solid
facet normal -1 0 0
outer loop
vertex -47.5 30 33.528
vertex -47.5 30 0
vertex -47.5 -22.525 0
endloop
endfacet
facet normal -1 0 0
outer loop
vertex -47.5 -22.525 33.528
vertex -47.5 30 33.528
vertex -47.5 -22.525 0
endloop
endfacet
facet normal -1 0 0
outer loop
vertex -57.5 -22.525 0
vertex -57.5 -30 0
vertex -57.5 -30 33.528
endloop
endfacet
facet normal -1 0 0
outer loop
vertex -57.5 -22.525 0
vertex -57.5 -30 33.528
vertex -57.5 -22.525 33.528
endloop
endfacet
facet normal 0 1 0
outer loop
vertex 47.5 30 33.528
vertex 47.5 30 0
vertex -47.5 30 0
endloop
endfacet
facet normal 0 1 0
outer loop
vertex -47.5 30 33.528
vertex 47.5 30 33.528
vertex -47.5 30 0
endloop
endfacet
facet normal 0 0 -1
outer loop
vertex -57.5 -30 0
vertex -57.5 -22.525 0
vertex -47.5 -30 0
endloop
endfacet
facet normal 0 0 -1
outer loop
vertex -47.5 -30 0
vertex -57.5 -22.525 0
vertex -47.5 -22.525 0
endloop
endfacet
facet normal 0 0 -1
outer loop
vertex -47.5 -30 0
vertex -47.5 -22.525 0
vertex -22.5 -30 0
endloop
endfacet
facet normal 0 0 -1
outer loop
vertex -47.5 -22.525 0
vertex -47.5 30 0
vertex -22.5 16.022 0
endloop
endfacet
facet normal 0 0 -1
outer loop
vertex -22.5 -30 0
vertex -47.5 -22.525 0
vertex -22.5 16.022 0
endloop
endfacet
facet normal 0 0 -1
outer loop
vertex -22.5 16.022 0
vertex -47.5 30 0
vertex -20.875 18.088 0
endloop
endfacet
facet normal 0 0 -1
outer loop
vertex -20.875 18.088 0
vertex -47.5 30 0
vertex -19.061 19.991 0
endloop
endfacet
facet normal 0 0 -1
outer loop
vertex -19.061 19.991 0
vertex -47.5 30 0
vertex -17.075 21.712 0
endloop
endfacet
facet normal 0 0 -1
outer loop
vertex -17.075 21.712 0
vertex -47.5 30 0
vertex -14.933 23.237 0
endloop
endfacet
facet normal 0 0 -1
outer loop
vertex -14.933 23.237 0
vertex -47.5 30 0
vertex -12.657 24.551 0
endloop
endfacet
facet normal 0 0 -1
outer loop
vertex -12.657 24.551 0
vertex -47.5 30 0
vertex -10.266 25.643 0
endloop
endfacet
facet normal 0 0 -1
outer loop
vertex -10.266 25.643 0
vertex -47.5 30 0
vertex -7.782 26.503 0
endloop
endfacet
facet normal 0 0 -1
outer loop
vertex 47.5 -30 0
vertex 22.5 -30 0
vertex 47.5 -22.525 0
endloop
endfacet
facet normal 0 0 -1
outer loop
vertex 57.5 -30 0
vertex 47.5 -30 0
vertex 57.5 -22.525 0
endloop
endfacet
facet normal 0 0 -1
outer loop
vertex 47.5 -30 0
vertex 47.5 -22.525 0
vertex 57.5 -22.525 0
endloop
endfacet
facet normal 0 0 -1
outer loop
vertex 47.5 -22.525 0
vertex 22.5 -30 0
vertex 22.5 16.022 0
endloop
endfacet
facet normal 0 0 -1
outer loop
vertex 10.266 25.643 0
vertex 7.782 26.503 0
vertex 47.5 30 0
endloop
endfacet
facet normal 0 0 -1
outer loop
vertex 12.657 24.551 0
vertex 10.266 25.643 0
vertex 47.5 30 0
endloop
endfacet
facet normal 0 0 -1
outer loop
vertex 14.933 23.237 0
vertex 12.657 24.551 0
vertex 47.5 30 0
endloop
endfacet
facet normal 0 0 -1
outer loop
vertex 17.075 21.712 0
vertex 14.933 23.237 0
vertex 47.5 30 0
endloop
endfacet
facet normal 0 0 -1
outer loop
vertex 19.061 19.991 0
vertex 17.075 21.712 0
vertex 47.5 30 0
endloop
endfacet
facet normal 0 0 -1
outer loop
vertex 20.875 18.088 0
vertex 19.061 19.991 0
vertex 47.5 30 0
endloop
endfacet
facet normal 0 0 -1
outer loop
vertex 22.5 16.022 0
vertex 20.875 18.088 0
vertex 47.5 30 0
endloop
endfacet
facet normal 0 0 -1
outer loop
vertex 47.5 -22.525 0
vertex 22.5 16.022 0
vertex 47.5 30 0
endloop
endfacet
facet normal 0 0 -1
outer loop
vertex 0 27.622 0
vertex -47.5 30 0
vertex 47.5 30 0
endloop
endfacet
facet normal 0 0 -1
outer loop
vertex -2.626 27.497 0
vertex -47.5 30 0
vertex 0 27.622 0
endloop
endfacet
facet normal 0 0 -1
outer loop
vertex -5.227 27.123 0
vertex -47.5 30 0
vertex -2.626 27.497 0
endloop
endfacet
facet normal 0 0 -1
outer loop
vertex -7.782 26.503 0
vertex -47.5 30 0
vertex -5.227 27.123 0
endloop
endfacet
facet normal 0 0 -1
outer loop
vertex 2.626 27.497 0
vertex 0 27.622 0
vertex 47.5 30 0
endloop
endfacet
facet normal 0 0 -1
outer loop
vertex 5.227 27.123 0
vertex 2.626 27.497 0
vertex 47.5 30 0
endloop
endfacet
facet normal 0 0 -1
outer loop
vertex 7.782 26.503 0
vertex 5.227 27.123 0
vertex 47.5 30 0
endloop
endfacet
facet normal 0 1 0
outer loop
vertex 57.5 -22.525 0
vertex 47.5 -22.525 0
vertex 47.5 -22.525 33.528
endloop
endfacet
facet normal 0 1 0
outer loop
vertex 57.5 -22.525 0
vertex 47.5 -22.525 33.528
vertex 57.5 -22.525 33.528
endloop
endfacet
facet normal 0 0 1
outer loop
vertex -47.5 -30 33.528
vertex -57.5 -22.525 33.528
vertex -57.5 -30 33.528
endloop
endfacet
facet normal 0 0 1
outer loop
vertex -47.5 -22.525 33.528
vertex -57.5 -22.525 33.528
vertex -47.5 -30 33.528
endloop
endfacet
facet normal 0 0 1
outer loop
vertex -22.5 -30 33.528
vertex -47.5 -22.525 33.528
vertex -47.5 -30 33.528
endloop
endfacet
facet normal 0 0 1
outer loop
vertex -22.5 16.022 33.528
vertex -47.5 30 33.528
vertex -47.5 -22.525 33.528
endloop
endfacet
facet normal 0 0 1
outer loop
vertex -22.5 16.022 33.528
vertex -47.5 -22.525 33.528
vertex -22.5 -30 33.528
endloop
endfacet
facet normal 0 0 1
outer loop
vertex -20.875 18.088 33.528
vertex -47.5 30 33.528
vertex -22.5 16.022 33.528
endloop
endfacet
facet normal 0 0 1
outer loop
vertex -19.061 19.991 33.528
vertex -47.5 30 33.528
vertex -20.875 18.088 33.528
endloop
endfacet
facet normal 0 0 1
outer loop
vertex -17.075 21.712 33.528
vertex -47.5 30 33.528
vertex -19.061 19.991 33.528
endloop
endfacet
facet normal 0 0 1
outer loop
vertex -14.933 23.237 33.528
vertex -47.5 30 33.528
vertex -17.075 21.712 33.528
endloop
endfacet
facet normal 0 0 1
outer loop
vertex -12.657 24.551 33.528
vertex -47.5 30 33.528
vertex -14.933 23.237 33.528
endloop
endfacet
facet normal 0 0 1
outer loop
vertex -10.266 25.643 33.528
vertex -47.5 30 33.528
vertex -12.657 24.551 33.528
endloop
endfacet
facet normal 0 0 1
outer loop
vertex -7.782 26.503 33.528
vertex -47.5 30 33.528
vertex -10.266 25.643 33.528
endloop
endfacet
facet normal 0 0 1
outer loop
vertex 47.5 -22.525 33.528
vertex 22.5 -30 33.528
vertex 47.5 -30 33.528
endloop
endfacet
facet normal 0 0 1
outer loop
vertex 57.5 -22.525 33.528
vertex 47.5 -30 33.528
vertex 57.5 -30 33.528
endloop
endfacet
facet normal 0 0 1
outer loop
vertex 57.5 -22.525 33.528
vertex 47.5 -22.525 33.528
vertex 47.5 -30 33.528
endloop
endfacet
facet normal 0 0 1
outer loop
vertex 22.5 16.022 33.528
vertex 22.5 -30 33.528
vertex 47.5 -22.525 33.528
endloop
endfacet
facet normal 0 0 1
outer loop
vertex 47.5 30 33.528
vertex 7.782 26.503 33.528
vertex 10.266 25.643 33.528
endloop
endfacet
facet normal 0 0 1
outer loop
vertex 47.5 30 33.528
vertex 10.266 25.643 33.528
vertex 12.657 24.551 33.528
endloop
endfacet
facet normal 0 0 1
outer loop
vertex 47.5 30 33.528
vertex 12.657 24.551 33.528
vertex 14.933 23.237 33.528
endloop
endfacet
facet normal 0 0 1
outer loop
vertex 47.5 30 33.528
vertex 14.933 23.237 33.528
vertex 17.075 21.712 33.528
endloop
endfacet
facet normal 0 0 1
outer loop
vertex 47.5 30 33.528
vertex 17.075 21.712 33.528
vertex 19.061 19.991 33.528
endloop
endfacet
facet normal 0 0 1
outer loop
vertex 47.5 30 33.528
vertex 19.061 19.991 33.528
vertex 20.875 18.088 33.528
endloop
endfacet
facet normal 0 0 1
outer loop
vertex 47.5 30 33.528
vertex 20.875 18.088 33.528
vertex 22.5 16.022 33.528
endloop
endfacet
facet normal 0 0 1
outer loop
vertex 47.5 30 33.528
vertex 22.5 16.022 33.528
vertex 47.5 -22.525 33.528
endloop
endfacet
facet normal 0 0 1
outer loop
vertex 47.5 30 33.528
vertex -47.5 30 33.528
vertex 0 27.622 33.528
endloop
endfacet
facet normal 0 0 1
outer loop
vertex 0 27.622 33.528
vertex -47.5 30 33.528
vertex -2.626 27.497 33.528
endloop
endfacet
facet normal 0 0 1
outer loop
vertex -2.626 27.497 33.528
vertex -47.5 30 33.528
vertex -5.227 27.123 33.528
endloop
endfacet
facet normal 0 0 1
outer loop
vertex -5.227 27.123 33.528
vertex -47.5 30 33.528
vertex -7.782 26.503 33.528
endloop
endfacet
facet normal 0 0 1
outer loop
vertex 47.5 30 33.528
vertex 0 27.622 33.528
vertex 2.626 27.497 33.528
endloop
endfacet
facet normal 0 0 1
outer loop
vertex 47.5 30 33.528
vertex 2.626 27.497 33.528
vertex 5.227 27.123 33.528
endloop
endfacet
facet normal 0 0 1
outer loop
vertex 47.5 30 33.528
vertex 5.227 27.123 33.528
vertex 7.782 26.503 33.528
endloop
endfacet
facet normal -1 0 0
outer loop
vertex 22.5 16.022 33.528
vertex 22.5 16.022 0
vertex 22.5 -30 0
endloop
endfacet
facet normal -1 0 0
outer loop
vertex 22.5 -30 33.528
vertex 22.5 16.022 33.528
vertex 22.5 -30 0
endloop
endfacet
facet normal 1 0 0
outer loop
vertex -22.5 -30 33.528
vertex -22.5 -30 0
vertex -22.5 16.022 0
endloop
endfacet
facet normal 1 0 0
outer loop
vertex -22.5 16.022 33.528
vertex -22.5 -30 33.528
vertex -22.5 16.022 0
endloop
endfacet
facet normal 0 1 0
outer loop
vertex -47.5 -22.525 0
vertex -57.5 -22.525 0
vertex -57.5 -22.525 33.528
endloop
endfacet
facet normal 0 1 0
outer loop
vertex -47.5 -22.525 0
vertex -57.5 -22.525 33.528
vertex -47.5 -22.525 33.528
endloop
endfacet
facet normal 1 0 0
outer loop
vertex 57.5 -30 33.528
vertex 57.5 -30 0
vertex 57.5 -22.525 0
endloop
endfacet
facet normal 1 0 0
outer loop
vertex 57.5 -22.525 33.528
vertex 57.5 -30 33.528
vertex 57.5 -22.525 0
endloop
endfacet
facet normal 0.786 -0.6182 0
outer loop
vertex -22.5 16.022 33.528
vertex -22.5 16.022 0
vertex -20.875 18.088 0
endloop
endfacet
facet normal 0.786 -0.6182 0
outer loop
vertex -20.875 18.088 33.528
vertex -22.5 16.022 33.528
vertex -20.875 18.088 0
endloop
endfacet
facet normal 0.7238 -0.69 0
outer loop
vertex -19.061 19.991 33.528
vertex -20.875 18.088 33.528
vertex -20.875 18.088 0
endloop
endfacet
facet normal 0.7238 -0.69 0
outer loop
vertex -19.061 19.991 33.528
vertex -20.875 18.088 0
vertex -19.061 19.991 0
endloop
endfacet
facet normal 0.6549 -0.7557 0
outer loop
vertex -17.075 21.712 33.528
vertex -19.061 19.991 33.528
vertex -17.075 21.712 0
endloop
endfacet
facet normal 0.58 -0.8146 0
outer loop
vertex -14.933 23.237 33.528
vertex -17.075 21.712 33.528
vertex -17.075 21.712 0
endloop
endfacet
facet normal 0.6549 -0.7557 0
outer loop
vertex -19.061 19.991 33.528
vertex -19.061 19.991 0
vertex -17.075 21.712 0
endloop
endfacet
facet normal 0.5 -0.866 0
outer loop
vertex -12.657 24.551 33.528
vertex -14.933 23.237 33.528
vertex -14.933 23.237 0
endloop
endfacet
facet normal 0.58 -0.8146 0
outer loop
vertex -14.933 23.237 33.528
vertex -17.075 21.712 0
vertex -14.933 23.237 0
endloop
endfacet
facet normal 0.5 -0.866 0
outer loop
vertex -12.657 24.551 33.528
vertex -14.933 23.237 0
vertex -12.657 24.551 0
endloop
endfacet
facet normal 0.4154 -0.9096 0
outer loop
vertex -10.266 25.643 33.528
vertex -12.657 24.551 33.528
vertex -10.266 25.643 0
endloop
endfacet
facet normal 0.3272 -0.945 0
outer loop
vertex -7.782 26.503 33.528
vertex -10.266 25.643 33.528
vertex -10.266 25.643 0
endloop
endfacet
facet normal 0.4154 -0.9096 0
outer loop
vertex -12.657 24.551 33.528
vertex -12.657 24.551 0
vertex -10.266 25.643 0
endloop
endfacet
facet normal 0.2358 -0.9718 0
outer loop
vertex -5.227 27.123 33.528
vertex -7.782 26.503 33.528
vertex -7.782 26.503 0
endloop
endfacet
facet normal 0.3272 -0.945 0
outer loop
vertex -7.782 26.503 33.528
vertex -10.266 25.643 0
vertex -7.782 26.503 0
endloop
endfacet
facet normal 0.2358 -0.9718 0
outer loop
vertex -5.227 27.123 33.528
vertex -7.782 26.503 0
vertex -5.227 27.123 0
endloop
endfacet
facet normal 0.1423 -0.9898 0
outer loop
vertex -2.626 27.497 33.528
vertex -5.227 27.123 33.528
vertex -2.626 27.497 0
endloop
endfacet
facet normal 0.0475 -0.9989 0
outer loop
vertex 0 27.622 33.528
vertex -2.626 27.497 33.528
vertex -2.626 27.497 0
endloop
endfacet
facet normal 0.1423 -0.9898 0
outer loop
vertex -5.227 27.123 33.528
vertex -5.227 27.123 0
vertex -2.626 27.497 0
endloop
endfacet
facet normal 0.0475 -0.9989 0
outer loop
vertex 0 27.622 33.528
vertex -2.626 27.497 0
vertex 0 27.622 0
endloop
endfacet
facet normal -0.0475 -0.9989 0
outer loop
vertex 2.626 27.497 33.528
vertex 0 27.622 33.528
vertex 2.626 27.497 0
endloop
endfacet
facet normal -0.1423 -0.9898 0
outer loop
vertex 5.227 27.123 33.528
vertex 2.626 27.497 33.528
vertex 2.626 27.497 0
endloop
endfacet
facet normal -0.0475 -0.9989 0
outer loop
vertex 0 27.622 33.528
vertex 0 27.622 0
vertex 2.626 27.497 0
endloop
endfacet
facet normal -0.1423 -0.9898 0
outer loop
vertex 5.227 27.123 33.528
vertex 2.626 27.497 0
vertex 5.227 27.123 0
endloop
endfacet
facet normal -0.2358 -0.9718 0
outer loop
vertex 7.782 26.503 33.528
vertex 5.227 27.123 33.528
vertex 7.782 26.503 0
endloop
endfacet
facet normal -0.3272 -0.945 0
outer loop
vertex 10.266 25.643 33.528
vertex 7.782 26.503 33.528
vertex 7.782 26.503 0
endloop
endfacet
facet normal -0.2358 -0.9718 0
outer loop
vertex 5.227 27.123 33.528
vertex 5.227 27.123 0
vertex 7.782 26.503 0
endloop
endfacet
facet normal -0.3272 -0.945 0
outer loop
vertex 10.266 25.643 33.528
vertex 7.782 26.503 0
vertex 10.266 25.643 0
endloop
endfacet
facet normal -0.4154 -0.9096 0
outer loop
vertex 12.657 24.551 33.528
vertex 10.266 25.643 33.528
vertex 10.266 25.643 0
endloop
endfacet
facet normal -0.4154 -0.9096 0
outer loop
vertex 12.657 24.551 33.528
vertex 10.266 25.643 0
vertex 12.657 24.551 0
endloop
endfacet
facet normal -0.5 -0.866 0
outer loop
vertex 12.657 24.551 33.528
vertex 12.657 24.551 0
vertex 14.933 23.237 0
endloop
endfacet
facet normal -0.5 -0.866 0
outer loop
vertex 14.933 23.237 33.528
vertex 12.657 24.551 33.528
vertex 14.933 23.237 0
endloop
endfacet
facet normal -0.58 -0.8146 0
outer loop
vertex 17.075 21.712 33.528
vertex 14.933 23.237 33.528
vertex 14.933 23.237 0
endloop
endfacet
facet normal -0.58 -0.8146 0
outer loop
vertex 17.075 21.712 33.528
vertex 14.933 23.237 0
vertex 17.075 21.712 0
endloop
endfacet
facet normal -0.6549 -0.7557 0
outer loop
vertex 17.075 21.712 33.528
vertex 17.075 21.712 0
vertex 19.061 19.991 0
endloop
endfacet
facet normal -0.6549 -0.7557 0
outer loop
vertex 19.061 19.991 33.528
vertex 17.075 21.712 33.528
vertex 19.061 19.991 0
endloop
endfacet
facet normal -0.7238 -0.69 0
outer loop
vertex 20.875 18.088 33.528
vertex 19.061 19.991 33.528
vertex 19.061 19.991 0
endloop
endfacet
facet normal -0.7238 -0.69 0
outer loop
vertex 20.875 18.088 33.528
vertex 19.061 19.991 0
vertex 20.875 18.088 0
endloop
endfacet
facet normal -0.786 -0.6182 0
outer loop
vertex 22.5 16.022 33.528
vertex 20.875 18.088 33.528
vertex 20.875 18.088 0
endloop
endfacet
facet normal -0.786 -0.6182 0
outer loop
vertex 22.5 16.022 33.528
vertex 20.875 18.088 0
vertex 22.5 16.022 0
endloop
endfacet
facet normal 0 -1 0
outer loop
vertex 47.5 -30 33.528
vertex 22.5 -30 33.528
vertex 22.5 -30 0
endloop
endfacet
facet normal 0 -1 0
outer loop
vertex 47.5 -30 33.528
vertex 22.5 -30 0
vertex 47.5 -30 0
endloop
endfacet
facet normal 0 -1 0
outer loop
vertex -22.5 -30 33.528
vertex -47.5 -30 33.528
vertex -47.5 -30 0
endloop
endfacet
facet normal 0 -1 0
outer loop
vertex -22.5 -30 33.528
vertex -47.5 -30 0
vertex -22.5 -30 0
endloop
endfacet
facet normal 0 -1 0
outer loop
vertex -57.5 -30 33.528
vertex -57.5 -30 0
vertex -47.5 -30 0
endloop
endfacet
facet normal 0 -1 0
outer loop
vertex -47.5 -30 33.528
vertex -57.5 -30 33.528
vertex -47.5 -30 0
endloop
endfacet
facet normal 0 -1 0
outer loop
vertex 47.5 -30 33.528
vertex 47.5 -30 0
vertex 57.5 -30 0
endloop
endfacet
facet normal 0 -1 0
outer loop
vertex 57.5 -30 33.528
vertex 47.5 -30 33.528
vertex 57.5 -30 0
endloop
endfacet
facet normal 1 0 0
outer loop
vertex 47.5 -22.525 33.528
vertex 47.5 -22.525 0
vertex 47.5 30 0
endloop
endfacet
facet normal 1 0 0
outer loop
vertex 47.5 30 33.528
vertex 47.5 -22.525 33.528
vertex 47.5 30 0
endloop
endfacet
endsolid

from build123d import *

# Parameters (mm, degrees)
F0_W     = 10
F0_H     = 7.475247
F1_DEPTH = 33.528


with BuildPart() as f1:
    # F0 (on Top) → F1 (new body)
    with BuildSketch(Plane.XY):
        with Locations((-52.5, -26.262377)):
            Rectangle(F0_W, F0_H)
        with Locations((52.5, -26.262377)):
            Rectangle(F0_W, F0_H)
        with BuildLine():
            Line((47.5, 30), (-47.5, 30))
            Line((-47.5, 30), (-47.5, -22.524753))
            Line((-47.5, -22.524753), (-47.5, -30))
            Line((-47.5, -30), (-22.5, -30))
            Line((-22.5, -30), (-22.5, 0))
            Line((-22.5, 0), (-22.5, 16.022185))
            ThreePointArc((-22.5, 16.022185), (0, 27.621738), (22.5, 16.022185))
            Line((22.5, 16.022185), (22.5, 0))
            Line((22.5, 0), (22.5, -30))
            Line((22.5, -30), (47.5, -30))
            Line((47.5, -30), (47.5, -22.524753))
            Line((47.5, -22.524753), (47.5, 30))
        make_face()
    extrude(amount=F1_DEPTH)


solid = f1.part
